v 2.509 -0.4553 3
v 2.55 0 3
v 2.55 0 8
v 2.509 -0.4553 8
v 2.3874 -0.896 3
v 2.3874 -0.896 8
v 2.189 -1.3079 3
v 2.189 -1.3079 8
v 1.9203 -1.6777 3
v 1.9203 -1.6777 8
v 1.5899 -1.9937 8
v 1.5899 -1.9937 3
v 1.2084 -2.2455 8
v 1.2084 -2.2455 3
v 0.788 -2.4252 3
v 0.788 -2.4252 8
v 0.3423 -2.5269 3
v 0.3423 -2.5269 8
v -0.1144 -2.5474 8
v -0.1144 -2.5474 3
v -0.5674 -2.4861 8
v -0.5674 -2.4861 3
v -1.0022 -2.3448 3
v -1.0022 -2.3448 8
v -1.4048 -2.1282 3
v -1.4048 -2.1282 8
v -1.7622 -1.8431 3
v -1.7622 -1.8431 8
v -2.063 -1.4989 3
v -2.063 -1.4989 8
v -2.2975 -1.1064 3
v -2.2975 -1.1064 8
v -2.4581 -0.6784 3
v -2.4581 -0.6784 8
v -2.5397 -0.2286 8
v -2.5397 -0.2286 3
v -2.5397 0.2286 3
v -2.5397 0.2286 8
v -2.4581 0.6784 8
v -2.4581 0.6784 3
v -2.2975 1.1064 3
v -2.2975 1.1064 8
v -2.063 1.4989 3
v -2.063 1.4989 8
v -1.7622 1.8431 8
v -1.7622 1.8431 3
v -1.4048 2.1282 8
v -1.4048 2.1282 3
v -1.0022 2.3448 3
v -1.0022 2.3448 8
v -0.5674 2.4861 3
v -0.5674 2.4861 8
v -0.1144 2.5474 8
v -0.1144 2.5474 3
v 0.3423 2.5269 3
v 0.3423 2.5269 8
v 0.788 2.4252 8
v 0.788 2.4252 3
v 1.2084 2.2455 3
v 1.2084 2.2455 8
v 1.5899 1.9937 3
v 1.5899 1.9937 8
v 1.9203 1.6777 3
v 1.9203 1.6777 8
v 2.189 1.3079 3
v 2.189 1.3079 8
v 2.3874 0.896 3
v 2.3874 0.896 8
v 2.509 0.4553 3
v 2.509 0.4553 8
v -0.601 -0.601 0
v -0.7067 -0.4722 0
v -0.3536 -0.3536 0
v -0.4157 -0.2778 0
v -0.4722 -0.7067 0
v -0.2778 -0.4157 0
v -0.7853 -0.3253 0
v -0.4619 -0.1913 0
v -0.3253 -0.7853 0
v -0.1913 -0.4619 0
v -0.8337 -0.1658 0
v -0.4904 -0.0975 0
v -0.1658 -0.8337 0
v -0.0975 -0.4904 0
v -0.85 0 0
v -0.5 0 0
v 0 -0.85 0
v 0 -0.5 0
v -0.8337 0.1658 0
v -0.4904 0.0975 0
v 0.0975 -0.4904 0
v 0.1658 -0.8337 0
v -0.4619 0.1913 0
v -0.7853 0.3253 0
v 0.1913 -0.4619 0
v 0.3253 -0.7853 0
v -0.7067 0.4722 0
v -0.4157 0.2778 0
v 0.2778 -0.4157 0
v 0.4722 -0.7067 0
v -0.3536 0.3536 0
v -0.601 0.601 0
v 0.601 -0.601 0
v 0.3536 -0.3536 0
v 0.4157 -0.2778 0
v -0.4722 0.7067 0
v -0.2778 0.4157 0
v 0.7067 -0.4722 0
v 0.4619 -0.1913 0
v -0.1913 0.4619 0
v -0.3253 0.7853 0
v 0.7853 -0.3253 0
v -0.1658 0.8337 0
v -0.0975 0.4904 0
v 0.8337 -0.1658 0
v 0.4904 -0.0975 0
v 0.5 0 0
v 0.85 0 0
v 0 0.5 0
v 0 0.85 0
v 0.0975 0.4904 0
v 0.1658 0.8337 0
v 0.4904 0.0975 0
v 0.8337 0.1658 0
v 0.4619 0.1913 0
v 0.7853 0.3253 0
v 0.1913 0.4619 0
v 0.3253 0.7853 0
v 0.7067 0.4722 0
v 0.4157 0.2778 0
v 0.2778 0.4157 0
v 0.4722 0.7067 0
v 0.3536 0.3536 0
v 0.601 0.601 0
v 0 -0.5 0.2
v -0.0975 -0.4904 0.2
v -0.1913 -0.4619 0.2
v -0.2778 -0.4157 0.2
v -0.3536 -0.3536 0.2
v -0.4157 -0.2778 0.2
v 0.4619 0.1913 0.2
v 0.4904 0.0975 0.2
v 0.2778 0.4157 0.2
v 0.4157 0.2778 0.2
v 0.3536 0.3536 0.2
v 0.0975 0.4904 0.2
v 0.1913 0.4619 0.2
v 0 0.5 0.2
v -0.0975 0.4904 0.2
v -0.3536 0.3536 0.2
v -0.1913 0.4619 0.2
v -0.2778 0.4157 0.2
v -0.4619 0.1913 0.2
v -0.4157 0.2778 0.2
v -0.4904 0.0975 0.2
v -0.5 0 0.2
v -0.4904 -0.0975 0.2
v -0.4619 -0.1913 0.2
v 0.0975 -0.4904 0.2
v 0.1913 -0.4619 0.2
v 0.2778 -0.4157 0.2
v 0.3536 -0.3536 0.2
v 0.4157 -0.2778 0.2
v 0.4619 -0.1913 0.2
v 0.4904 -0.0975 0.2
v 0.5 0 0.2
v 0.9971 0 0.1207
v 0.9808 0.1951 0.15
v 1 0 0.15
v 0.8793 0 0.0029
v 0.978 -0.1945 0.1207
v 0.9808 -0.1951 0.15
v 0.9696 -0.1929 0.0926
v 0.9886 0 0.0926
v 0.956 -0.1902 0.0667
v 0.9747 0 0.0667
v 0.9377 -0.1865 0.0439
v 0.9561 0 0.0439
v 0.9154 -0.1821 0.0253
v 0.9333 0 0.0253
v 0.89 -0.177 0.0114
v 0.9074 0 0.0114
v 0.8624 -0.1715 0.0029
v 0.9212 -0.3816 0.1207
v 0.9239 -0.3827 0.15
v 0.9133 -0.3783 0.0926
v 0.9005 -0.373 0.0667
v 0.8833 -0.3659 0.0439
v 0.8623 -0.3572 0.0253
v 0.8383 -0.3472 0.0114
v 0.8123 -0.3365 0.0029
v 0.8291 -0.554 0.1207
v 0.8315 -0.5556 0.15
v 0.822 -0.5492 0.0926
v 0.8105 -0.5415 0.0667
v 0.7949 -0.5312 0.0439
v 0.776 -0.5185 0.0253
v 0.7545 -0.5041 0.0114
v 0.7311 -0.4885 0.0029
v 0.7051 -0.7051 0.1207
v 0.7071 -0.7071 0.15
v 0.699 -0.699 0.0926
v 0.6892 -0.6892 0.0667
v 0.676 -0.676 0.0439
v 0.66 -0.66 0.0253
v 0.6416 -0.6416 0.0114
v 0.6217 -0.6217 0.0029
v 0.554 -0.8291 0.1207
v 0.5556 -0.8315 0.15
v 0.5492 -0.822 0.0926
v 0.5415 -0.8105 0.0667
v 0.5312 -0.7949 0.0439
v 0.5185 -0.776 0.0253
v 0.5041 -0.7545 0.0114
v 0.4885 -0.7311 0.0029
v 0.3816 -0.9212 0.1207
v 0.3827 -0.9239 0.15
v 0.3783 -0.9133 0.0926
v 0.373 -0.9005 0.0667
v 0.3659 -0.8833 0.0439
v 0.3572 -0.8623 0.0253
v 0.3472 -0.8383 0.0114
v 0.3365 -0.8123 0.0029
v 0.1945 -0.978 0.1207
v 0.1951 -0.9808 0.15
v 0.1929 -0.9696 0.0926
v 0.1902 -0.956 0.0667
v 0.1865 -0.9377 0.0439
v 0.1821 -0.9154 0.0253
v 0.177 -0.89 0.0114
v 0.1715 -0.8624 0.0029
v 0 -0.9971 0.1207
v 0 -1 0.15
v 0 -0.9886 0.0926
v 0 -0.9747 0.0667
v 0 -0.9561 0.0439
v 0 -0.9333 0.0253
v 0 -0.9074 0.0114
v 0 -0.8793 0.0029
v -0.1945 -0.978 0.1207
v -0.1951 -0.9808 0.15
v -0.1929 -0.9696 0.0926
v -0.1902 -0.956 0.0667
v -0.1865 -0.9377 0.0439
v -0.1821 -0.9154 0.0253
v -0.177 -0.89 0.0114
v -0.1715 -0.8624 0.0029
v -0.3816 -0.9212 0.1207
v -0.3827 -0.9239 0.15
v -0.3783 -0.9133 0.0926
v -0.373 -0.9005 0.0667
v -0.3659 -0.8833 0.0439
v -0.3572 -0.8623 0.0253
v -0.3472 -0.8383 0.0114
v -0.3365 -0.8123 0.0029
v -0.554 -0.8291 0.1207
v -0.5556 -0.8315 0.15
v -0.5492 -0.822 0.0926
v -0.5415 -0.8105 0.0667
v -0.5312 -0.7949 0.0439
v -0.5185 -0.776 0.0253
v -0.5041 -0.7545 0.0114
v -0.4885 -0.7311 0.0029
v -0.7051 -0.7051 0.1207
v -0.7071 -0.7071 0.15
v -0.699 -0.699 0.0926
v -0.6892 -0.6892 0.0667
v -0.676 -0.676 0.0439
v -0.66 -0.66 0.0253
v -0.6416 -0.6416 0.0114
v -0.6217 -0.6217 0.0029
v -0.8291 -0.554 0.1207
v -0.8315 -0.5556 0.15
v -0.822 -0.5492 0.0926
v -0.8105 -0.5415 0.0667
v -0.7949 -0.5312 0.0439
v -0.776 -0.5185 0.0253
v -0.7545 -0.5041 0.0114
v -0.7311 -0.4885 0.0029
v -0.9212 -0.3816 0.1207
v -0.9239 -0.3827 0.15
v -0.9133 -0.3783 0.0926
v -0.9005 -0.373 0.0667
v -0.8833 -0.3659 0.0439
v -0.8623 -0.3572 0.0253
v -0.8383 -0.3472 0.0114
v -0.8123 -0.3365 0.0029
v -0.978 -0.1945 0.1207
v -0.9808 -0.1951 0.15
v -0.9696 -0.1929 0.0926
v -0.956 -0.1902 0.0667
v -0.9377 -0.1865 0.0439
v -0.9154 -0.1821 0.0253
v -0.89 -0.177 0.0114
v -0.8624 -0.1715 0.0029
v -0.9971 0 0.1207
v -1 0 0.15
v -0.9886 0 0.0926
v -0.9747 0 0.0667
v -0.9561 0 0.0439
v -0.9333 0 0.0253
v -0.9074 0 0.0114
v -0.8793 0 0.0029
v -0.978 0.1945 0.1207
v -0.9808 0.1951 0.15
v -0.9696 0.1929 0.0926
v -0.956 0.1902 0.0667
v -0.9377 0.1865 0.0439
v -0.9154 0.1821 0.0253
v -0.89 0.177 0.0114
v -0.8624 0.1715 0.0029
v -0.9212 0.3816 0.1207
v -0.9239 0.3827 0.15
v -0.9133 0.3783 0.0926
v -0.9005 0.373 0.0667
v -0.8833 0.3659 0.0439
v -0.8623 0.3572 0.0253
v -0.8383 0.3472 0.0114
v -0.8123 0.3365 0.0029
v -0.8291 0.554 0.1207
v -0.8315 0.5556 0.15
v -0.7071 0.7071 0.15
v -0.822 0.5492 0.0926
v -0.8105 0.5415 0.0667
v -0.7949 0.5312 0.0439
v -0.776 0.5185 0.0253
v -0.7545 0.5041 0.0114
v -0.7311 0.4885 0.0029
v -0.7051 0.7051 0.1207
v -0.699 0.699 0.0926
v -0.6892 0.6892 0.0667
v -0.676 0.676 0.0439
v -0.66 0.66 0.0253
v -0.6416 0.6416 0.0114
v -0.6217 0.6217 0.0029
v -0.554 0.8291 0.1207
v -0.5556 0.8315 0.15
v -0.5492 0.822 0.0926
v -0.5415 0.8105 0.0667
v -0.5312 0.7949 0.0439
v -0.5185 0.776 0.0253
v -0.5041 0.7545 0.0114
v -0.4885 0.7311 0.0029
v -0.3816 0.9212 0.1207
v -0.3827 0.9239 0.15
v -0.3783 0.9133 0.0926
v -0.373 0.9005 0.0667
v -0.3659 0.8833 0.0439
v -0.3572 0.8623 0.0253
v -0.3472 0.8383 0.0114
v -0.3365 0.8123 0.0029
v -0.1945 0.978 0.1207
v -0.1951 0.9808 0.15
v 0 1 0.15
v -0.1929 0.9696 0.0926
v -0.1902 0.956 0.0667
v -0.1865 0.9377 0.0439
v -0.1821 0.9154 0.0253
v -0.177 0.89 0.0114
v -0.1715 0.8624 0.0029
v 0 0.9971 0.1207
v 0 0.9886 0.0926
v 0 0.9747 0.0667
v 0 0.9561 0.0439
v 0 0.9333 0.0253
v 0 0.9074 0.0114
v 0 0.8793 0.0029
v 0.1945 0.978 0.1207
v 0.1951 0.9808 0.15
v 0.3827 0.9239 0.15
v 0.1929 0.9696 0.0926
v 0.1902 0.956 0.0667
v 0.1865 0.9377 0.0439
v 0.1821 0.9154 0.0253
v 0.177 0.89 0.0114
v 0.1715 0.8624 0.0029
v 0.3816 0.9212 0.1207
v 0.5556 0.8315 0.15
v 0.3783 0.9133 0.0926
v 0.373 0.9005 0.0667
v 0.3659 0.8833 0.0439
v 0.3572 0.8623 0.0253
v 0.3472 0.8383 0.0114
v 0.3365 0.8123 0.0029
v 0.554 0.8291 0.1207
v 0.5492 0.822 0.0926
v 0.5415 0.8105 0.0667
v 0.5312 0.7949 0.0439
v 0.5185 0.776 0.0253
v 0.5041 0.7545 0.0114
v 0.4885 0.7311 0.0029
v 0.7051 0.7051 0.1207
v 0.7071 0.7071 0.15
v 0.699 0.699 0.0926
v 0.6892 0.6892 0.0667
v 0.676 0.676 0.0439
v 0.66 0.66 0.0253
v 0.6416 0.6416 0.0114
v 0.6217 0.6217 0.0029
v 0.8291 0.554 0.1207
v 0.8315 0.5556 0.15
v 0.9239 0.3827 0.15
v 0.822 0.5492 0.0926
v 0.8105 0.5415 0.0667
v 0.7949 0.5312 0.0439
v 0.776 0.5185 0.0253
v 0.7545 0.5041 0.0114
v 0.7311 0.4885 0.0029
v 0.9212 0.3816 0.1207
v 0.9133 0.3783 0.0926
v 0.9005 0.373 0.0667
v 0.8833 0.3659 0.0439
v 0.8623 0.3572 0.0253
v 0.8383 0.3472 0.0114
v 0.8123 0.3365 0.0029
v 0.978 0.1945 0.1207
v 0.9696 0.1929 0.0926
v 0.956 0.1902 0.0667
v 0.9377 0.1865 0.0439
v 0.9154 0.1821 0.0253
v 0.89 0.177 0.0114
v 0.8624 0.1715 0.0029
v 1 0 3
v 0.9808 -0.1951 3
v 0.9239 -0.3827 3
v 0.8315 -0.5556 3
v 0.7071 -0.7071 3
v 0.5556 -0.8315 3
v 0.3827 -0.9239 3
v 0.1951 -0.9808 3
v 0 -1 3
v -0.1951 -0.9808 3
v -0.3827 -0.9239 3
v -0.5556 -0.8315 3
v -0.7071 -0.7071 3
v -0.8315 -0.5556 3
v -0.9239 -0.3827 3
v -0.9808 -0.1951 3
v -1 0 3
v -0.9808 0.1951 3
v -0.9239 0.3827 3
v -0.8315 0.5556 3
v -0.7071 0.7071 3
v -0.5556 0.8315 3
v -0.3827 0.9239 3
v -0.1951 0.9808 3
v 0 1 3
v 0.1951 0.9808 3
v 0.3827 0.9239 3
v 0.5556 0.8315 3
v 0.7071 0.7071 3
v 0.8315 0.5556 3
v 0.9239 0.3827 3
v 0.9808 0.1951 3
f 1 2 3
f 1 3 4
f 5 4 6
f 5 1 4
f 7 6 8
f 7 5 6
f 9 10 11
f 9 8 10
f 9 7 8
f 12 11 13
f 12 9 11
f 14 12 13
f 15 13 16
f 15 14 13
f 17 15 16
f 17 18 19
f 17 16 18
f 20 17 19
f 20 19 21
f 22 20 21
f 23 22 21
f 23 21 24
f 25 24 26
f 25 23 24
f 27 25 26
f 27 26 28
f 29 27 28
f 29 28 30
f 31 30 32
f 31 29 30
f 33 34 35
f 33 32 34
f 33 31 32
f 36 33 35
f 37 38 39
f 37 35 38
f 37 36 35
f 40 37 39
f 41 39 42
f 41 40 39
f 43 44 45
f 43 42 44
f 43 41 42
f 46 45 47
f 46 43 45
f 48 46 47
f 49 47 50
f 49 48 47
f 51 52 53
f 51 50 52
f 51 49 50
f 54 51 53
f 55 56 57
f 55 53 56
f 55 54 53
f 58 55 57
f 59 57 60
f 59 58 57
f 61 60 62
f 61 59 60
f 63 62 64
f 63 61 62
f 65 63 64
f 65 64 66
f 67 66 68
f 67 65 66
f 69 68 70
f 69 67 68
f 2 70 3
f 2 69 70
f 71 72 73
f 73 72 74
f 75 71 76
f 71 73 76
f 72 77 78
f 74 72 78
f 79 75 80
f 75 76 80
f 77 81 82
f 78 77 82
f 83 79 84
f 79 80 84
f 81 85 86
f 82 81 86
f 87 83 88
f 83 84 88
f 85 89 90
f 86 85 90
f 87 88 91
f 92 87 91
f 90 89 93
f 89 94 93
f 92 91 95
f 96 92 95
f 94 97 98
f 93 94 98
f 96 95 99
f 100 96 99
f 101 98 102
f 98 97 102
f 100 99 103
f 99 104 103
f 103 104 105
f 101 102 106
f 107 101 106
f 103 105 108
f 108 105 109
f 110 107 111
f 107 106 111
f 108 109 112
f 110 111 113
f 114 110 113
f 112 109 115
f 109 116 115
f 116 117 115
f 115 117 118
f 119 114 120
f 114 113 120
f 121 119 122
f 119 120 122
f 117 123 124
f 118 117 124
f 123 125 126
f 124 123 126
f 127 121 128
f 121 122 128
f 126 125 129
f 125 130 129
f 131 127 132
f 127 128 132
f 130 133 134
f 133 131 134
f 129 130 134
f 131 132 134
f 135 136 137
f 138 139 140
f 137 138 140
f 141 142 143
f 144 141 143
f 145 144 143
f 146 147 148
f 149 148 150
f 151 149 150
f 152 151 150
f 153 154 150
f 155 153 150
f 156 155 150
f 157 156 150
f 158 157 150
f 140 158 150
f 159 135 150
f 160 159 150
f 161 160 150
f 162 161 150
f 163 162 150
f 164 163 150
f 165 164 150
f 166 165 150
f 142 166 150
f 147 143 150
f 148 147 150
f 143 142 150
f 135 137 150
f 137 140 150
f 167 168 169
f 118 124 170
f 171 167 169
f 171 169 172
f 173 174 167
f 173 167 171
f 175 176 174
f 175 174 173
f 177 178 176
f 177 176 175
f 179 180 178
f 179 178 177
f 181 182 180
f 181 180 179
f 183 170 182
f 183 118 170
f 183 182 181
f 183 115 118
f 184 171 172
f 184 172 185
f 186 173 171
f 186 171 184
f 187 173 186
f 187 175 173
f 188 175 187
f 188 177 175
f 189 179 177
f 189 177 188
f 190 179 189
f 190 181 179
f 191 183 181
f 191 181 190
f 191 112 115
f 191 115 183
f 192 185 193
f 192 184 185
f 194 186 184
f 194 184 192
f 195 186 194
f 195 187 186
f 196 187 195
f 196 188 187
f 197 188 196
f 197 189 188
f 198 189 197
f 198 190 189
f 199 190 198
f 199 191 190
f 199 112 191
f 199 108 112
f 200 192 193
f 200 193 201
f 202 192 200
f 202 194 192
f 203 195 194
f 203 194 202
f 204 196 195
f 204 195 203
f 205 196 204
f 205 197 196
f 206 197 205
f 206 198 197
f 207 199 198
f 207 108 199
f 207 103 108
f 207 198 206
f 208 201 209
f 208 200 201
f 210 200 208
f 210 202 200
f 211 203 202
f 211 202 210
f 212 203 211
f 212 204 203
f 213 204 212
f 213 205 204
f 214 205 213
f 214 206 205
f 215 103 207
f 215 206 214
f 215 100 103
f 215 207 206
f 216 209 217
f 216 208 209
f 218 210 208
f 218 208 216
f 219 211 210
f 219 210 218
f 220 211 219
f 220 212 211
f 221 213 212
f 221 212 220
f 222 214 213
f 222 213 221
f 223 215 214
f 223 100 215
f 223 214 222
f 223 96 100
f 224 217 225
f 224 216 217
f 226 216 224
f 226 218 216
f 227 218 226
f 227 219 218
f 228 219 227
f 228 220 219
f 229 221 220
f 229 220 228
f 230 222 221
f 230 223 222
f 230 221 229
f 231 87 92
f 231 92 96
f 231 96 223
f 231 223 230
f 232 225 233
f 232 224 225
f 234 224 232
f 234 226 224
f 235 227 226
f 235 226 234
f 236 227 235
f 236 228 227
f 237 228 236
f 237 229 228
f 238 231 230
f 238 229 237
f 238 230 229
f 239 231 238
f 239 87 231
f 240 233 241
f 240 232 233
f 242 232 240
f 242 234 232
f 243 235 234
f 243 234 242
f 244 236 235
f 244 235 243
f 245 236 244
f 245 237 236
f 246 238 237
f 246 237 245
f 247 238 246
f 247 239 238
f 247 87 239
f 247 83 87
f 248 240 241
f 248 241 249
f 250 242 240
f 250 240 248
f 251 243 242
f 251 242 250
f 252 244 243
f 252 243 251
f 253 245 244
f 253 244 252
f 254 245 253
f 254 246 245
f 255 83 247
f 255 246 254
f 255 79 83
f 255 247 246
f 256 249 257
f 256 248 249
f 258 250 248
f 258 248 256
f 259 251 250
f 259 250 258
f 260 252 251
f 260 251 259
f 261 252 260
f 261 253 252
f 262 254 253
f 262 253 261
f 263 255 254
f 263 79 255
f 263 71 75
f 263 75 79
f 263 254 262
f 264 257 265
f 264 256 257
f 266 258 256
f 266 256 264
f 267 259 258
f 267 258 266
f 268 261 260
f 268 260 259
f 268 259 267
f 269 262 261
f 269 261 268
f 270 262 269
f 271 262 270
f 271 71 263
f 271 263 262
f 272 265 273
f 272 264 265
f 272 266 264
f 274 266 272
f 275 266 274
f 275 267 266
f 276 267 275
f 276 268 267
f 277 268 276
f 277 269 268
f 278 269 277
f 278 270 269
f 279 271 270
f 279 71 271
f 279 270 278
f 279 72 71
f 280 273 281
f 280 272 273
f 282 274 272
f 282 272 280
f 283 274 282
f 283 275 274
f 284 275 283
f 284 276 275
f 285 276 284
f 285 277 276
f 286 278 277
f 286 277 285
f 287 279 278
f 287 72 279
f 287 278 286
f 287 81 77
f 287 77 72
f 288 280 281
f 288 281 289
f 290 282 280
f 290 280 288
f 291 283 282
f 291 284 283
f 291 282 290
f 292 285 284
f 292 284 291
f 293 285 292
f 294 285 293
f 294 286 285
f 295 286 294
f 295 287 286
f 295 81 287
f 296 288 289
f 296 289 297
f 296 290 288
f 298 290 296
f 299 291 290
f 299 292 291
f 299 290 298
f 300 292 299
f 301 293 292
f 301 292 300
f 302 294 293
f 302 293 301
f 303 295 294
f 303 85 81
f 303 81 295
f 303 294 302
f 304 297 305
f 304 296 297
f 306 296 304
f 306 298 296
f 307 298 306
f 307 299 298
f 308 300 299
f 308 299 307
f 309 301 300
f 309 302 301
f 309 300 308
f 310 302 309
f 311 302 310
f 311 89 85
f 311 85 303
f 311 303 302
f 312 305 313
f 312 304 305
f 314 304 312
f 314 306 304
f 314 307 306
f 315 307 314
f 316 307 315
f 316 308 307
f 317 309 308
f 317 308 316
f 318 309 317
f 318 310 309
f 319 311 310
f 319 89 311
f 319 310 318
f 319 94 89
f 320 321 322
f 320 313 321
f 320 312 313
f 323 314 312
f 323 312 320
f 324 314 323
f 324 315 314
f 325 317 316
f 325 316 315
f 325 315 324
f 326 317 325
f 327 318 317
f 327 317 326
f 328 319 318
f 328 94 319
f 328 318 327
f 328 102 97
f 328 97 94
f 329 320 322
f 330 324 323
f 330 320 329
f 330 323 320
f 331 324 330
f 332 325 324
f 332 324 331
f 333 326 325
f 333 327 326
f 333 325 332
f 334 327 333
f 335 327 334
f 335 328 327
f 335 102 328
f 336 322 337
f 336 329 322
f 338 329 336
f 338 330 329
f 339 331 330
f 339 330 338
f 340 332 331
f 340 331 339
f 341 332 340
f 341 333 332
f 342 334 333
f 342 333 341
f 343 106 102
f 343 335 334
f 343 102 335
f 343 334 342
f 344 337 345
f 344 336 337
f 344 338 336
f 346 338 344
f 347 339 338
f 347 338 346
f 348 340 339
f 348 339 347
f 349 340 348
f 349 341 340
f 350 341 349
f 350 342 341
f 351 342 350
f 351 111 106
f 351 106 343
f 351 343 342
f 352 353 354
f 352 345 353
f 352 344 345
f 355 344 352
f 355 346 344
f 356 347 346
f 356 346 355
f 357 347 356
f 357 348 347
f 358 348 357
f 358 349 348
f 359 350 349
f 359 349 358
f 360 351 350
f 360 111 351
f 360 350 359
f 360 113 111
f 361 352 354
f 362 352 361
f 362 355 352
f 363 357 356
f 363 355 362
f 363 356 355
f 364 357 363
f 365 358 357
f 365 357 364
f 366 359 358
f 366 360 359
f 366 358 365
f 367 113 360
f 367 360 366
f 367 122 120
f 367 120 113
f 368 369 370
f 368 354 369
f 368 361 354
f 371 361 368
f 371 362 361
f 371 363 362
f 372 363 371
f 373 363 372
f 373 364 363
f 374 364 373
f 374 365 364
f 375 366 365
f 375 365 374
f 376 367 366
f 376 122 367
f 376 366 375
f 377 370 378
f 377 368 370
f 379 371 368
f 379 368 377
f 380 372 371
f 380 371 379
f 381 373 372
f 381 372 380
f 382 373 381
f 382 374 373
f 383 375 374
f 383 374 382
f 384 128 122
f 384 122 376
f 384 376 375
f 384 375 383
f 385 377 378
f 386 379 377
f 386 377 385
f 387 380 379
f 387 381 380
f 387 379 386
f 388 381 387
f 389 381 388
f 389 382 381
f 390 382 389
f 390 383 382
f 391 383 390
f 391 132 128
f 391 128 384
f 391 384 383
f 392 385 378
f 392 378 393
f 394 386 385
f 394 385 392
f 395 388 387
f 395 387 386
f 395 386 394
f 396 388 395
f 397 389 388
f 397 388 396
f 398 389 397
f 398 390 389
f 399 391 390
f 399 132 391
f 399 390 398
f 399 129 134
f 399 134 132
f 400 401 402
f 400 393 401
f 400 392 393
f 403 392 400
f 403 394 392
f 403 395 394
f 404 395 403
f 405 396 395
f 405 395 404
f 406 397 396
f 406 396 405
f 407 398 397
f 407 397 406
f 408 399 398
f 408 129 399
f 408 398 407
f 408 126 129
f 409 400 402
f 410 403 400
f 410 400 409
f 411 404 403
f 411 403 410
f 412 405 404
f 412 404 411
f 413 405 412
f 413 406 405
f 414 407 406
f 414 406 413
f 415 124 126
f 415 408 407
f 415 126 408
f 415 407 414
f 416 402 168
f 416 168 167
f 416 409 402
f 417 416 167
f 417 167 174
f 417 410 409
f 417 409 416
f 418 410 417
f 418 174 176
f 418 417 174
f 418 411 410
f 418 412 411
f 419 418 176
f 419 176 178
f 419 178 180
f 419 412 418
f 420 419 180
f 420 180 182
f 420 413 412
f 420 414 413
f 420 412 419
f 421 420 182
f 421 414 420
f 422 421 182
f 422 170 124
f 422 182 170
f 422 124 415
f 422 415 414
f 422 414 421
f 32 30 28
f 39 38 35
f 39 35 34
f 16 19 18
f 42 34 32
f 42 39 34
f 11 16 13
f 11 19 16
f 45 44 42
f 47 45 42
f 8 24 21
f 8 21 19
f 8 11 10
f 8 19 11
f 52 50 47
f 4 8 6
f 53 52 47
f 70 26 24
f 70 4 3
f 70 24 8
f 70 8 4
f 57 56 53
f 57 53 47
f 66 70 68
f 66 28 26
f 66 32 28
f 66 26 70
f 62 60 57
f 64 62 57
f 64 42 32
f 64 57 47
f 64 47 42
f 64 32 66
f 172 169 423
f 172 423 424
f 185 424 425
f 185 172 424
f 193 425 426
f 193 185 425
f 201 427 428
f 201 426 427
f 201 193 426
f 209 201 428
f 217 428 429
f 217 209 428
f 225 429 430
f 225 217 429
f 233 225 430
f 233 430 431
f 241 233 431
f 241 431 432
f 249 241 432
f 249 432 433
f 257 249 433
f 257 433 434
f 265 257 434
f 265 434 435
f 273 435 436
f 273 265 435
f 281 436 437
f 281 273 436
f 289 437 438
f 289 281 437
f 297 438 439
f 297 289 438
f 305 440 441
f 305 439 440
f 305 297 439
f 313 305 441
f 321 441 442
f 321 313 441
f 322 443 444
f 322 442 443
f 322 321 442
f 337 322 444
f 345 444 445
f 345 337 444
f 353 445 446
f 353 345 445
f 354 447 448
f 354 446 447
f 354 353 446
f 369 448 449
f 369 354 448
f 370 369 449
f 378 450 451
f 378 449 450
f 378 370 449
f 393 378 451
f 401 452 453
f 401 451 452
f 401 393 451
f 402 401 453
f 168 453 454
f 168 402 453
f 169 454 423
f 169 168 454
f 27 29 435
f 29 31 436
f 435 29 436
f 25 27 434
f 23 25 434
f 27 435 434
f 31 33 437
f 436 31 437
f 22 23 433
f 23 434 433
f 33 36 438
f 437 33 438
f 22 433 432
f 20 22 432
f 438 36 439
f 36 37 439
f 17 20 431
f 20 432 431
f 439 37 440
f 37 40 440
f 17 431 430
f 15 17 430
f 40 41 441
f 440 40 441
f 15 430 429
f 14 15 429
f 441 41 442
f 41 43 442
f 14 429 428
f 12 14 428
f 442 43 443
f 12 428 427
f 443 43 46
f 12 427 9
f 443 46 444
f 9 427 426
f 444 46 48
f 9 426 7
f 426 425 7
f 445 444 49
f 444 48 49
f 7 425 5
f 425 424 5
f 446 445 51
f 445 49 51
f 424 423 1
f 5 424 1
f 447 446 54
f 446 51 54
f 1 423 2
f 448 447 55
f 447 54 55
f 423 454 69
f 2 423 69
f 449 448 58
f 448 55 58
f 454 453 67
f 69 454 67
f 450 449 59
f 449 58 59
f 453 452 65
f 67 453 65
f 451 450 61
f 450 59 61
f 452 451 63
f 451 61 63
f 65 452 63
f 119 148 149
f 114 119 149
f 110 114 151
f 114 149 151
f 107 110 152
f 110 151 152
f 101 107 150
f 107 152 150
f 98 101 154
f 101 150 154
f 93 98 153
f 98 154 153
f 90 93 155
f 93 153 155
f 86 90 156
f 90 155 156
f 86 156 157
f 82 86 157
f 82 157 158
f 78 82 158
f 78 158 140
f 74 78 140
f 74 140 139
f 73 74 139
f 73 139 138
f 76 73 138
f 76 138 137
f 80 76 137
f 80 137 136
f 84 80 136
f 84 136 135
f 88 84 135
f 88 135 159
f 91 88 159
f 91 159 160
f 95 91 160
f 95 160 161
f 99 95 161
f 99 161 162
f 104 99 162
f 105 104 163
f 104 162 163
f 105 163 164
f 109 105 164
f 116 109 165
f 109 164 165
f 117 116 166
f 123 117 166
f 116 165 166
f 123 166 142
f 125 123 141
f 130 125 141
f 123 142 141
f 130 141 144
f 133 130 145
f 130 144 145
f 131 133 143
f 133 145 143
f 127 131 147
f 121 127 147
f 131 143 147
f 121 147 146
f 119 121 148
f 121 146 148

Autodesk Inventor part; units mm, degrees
ref_plane "YZ Plane" through (0, 0, 0) normal (1, 0, 0) x (0, 1, 0)
ref_plane "XZ Plane" through (0, 0, 0) normal (0, 1, 0) x (-1, 0, 0)
ref_plane "XY Plane" through (0, 0, 0) normal (0, 0, 1) x (1, 0, 0)
sketch "Sketch1" plane through (0, 0, 0) normal (0, 0, 1) x (1, 0, 0)
  circle A0 centre (0, 0) radius 1
  dimension "d0" = 2
extrude "Extrusion1" add sketch "Sketch1" along normal blind 3
sketch "Sketch2" plane through (0, 0, 3) normal (0, 0, 1) x (1, 0, 0)
  circle A0 centre (0, 0) radius 1 projected
  circle A1 centre (0, 0) radius 2.55
  dimension "d3" = 5.1
extrude "Extrusion2" add sketch "Sketch2" along normal blind 5 contours A0 | A1
fillet "Fillet1" radius 0.15 1 edges at (-1, 0, 0)
sketch "Sketch3" plane through (0, 0, 0) normal (0, 0, -1) x (-1, 0, 0)
  circle A0 centre (0, 0) radius 0.85 projected
  circle A1 centre (0, 0) radius 0.5
  dimension "d7" = 1
extrude "Extrusion3" [suppressed]
hole "Hole1" at (0, 0, 0) direction (0, 0, 1) diameter 1 depth 0.2
properties part number "Jig_Bearing_Asm_Pusher"
